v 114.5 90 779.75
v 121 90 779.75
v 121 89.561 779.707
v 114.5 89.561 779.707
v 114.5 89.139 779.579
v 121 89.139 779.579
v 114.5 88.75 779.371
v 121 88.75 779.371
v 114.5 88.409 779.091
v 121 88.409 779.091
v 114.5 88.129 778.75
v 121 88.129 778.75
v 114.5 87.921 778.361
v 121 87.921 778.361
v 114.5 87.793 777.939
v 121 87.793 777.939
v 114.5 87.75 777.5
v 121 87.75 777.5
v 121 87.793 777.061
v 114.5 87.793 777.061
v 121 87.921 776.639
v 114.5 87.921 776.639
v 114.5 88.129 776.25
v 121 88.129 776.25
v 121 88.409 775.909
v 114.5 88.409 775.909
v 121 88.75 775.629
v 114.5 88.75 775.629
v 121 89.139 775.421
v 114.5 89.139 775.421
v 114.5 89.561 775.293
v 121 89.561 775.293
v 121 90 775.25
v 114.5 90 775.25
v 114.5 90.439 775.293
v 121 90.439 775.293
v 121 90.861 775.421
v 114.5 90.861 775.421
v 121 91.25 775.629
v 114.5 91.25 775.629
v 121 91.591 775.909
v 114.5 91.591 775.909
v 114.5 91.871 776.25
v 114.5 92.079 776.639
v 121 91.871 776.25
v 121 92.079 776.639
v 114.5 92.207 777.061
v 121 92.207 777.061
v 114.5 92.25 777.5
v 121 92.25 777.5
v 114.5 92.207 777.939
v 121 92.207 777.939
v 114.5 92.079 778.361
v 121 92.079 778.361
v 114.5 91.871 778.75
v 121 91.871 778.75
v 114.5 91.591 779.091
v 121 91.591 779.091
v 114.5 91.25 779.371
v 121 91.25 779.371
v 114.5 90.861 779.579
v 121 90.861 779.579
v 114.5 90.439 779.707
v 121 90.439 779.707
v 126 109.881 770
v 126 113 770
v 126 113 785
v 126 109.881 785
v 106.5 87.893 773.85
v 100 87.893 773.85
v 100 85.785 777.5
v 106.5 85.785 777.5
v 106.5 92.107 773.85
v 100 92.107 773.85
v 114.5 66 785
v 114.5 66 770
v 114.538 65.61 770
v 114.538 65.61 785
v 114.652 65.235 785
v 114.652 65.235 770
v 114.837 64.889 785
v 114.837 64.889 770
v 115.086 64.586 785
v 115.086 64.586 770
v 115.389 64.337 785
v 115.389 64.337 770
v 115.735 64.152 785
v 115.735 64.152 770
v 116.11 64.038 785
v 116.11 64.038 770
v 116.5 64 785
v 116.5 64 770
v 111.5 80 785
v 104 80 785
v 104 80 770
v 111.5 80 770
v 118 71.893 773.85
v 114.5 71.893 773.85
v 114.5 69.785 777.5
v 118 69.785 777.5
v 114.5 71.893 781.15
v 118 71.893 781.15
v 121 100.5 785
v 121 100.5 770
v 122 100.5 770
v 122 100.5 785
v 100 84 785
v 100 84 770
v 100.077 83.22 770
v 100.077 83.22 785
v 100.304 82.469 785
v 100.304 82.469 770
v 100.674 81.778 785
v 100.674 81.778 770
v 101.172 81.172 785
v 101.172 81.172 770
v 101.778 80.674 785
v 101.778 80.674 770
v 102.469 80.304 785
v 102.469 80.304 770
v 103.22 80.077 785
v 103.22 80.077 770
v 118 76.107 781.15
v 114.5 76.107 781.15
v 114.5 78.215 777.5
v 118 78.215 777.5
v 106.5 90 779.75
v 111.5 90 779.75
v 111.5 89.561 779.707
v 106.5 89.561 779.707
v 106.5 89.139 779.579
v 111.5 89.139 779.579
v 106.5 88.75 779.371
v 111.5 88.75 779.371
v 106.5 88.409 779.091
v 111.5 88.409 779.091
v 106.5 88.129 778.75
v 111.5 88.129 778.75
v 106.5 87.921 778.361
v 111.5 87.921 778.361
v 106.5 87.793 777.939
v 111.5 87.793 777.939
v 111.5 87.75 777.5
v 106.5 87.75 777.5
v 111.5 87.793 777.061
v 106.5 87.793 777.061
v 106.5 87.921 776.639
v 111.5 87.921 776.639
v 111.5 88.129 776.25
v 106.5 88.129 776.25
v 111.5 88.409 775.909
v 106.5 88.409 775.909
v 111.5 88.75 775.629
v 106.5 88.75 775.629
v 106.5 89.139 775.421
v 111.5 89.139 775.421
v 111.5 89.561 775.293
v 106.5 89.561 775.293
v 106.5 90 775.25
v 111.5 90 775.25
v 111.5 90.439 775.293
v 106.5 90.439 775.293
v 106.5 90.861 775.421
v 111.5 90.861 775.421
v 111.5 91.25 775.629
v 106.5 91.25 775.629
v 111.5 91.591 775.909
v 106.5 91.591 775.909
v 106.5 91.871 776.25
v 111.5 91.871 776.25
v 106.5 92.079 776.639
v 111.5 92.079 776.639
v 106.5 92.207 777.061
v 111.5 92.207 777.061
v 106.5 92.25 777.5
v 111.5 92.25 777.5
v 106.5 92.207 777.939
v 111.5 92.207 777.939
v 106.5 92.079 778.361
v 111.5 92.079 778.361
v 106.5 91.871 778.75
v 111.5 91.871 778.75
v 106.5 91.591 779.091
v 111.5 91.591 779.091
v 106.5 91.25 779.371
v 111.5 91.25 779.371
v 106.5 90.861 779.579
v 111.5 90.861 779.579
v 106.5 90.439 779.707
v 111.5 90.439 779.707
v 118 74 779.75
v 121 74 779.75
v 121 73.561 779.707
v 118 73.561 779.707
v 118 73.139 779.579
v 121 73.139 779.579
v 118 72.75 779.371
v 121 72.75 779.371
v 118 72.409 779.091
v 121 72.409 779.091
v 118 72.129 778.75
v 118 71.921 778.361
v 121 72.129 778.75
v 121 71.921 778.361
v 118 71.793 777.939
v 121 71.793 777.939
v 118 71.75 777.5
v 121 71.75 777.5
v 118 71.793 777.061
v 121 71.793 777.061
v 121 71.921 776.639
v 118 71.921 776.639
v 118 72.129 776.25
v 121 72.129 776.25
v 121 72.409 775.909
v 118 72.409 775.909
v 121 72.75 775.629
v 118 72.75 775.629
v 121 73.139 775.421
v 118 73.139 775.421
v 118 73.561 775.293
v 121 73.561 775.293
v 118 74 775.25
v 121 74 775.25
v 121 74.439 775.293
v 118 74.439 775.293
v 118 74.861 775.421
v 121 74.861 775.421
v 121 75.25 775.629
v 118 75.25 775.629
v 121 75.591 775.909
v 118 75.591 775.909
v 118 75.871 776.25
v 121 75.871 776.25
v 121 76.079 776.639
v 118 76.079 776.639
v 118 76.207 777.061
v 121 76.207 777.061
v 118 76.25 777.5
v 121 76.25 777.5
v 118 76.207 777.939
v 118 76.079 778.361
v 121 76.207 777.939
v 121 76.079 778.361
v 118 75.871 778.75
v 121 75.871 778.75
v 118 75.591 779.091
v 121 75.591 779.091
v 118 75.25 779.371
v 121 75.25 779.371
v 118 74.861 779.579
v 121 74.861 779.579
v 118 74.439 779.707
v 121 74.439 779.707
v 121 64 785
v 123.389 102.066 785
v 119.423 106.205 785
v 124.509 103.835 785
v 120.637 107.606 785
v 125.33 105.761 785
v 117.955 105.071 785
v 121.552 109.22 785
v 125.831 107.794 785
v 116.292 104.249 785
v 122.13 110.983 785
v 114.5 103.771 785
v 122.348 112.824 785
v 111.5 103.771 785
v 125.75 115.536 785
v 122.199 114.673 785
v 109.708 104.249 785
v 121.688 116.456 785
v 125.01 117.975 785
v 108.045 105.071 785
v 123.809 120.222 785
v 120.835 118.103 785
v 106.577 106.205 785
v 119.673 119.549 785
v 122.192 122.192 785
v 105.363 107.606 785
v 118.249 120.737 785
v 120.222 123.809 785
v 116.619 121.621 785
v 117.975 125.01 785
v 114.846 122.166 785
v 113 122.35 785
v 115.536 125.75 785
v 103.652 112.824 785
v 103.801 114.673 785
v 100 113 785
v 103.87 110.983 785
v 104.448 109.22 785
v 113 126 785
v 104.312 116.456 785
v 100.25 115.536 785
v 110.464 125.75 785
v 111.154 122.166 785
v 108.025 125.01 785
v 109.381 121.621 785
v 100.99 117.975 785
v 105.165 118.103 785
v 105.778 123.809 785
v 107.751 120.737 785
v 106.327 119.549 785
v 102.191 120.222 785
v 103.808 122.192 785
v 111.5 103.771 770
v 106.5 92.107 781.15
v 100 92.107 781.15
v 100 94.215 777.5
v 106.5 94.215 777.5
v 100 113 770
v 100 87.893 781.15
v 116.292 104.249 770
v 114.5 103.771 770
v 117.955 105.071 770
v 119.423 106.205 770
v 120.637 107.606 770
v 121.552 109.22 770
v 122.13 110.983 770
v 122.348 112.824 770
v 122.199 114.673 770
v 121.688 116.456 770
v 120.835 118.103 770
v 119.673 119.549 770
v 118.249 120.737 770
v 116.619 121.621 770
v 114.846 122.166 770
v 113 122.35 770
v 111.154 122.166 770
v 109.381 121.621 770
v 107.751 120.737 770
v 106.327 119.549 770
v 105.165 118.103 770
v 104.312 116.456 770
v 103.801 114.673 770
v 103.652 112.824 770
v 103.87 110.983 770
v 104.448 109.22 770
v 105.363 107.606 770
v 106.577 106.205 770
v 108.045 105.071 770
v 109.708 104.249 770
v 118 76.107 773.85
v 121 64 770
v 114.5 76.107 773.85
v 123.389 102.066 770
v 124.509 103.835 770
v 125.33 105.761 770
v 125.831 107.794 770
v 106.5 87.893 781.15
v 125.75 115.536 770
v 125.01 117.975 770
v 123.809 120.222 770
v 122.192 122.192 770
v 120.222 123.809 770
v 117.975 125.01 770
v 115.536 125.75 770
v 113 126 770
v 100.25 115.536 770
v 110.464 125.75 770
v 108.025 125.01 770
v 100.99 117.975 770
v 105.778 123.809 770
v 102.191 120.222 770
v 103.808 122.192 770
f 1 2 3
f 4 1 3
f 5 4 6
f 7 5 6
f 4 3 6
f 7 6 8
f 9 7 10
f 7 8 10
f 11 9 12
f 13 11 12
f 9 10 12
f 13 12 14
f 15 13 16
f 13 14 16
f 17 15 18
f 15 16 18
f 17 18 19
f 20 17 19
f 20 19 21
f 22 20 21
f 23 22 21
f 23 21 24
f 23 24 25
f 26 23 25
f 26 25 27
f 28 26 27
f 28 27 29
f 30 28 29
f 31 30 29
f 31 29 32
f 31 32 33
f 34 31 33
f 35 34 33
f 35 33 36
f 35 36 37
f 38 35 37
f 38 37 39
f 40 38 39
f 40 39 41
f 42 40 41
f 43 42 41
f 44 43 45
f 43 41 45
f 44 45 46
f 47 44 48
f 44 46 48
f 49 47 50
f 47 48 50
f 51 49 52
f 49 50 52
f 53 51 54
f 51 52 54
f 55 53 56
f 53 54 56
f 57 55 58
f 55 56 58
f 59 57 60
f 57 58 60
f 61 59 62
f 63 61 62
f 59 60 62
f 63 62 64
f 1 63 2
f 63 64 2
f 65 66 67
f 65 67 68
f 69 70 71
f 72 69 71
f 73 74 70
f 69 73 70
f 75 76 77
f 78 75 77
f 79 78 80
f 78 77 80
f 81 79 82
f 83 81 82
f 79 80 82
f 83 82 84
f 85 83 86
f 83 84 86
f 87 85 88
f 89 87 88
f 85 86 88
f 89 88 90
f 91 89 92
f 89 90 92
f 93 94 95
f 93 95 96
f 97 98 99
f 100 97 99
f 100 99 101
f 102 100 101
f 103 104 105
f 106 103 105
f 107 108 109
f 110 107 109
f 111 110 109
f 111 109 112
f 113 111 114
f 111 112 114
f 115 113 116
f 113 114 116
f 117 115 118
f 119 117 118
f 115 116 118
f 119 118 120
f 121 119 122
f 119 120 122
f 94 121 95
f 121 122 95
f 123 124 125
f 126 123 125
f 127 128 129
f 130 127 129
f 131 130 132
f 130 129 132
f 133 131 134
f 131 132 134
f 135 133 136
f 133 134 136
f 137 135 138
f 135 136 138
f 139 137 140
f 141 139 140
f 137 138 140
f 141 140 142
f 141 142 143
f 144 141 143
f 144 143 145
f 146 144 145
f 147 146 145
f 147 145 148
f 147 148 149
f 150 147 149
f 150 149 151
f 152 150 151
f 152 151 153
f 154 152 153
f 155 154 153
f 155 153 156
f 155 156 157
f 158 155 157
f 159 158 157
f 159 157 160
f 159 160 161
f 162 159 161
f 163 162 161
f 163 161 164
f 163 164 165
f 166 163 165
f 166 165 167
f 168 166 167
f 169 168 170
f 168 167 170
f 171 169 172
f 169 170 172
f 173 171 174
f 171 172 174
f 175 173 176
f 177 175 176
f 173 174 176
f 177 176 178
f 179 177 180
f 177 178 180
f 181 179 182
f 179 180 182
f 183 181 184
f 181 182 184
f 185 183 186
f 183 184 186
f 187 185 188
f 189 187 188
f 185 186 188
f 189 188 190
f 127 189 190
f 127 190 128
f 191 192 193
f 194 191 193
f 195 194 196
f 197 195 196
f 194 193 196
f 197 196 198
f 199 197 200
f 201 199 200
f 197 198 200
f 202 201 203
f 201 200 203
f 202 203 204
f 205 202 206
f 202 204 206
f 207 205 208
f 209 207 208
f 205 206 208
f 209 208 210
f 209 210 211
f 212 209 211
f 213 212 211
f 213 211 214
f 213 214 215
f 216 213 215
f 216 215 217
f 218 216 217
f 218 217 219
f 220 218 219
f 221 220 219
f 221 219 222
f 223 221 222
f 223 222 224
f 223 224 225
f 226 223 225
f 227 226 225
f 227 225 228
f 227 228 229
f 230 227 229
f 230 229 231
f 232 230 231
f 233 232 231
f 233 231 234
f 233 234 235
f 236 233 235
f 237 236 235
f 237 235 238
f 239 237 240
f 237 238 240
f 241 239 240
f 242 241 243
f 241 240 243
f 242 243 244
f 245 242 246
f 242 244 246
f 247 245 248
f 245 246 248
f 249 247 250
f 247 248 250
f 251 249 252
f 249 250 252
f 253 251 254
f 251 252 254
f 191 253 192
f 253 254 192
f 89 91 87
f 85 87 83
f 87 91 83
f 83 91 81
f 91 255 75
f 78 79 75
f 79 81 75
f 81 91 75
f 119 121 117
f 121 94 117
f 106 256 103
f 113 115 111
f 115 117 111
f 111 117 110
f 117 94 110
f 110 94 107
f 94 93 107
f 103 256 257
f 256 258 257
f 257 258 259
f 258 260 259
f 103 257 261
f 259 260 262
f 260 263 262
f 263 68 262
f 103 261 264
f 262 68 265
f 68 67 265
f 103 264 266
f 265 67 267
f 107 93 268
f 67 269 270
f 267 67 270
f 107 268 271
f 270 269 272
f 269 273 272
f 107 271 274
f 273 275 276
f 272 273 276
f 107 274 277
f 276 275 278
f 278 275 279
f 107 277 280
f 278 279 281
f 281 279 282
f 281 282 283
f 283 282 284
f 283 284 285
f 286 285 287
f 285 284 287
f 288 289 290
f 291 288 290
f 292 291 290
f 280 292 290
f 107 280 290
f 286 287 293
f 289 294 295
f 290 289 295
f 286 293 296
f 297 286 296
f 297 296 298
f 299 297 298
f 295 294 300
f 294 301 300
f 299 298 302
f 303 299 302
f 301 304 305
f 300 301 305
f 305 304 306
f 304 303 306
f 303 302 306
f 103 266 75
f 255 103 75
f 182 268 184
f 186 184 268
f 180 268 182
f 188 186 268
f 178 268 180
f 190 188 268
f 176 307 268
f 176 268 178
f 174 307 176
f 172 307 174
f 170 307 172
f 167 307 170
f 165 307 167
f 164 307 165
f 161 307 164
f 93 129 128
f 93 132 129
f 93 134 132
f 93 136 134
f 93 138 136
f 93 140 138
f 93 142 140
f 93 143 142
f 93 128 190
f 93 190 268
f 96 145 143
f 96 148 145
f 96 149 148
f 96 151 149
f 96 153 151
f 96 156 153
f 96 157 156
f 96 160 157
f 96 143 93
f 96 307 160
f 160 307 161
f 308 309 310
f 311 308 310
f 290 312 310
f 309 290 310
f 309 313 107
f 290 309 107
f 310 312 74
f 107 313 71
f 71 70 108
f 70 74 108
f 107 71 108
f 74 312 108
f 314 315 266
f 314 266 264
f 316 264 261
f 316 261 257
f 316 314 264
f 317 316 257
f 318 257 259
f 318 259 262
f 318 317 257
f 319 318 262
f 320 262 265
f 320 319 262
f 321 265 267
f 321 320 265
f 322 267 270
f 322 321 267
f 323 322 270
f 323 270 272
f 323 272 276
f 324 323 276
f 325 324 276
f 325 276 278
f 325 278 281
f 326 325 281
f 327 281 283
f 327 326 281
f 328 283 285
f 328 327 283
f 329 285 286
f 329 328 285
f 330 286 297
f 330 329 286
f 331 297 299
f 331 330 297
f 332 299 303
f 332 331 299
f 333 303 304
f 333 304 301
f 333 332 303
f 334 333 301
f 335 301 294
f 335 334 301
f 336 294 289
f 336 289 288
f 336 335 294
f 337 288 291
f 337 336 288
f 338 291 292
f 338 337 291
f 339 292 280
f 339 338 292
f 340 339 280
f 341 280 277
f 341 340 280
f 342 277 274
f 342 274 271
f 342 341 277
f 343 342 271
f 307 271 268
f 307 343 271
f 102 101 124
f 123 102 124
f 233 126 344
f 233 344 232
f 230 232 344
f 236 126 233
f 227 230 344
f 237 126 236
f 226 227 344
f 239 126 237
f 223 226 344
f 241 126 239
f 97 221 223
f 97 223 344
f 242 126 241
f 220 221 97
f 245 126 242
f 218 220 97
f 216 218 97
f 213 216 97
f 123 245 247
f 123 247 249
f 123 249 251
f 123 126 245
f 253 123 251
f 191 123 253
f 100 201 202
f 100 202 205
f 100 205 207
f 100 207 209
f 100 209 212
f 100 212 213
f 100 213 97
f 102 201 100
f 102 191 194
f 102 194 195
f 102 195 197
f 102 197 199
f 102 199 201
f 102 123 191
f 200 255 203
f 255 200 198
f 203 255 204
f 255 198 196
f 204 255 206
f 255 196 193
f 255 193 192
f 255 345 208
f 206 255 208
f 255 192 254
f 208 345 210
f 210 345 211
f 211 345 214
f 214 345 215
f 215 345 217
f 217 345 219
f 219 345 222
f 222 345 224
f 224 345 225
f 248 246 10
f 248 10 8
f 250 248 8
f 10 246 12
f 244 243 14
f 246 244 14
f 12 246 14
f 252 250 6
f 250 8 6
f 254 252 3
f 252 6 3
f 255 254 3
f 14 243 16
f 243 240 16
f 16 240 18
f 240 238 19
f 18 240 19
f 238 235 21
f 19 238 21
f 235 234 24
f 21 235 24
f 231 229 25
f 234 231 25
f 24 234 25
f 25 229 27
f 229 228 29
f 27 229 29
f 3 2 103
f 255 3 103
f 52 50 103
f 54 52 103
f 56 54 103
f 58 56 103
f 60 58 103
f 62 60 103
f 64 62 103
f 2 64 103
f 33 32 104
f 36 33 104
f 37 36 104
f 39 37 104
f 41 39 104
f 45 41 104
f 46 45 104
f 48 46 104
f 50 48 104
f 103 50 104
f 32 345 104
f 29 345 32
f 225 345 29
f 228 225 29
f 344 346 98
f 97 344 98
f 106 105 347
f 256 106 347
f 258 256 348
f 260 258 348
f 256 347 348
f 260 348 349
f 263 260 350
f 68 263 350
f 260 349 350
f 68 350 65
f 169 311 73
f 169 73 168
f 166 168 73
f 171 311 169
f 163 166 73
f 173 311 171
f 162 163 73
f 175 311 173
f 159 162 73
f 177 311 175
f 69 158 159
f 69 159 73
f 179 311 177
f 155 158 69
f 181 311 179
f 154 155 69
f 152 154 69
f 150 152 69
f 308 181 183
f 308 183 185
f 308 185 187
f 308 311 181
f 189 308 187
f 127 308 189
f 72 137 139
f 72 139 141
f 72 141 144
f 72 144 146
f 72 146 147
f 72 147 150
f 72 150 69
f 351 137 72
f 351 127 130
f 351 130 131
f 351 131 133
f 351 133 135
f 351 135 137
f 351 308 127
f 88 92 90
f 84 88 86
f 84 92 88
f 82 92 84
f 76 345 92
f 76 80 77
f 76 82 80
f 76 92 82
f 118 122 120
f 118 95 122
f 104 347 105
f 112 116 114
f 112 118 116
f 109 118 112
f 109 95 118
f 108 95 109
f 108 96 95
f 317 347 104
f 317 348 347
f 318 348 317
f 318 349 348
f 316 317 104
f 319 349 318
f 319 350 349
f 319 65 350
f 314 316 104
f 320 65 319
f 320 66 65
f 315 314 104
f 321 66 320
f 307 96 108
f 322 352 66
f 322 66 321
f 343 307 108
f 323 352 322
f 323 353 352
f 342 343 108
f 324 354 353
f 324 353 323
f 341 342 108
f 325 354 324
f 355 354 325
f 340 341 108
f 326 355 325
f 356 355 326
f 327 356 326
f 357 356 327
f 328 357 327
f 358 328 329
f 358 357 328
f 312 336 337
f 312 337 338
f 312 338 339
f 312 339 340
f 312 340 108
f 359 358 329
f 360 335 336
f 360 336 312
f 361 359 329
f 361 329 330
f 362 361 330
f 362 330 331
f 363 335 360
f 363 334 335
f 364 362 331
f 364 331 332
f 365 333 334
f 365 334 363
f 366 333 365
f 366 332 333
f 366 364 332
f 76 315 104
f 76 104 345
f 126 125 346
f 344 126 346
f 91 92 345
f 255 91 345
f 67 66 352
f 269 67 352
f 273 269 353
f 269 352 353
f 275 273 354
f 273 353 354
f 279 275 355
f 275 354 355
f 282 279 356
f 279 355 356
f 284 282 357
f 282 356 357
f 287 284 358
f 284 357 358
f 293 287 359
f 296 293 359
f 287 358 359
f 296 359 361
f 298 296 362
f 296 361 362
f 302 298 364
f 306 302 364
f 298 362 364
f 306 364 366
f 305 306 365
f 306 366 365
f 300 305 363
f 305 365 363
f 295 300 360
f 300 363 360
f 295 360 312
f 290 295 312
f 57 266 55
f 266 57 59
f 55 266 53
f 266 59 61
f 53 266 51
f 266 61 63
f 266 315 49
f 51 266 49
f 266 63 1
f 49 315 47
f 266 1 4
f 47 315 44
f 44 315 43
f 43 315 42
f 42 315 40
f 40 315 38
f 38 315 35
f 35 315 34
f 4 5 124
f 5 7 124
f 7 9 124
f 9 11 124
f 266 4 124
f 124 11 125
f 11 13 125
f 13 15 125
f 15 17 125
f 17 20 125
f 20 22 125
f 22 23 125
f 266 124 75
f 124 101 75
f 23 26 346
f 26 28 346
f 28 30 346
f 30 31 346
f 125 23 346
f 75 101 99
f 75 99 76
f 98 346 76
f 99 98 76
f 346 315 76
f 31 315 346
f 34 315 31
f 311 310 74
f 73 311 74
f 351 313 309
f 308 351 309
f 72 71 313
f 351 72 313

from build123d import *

# Parameters (mm, degrees)
PAD029_DEPTH    = 15
SKETCH081_R     = 2.25
HOLE038_DEPTH   = 26.001
POCKET053_DEPTH = 18
POCKET054_DEPTH = 6.5


with BuildPart() as part:
    # Sketch079 → Pad029 (new body)
    with BuildSketch(Plane.XY):
        with BuildLine():
            ThreePointArc((117, 103.771105), (115.5, 122.35), (114, 103.771105))
            Line((114, 103.771105), (114, 80))
            Line((106.5, 80), (114, 80))
            ThreePointArc((102.5, 84), (103.671573, 81.171573), (106.5, 80))
            Line((102.5, 113), (102.5, 84))
            ThreePointArc((128.5, 113), (115.5, 126), (102.5, 113))
            Line((128.5, 113), (128.5, 109.880832))
            ThreePointArc((124.5, 100.5), (127.458261, 104.781812), (128.5, 109.880832))
            Line((123.5, 100.5), (124.5, 100.5))
            Line((123.5, 64), (123.5, 100.5))
            Line((119, 64), (123.5, 64))
            ThreePointArc((117, 66), (117.585786, 64.585786), (119, 64))
            Line((117, 103.771105), (117, 66))
        make_face()
    extrude(amount=PAD029_DEPTH)

    # Sketch081 (on DatumPlane) → Hole038 (cut, through all)
    with BuildSketch(Plane(origin=(128.5, 0, 0), x_dir=(0, 0, 1), z_dir=(1, 0, 0))):
        with Locations((7.5, -90)):
            Circle(SKETCH081_R)
        with Locations((7.5, -74)):
            Circle(SKETCH081_R)
    extrude(amount=-HOLE038_DEPTH, mode=Mode.SUBTRACT)

    # Sketch082 (on DatumPlane) → Pocket053 (cut)
    with BuildSketch(Plane(origin=(102.5, 0, 0), x_dir=(0, -1, 0), z_dir=(-1, 0, 0))):
        Polygon((-69.785343, 7.5), (-71.892672, 11.15), (-76.107328, 11.15), (-78.214657, 7.5), (-76.107328, 3.85), (-71.892672, 3.85), align=None)
    extrude(amount=-POCKET053_DEPTH, mode=Mode.SUBTRACT)

    # Sketch083 (on DatumPlane) → Pocket054 (cut)
    with BuildSketch(Plane(origin=(102.5, 0, 0), x_dir=(0, -1, 0), z_dir=(-1, 0, 0))):
        Polygon((-85.785343, 7.5), (-87.892672, 11.15), (-92.107328, 11.15), (-94.214657, 7.5), (-92.107328, 3.85), (-87.892672, 3.85), align=None)
    extrude(amount=-POCKET054_DEPTH, mode=Mode.SUBTRACT)


with BuildPart() as part_1:
    # Body022006 placement: moved
    add(part.part.moved(Location((-2.5, 0, 770))))


solid = part_1.part
